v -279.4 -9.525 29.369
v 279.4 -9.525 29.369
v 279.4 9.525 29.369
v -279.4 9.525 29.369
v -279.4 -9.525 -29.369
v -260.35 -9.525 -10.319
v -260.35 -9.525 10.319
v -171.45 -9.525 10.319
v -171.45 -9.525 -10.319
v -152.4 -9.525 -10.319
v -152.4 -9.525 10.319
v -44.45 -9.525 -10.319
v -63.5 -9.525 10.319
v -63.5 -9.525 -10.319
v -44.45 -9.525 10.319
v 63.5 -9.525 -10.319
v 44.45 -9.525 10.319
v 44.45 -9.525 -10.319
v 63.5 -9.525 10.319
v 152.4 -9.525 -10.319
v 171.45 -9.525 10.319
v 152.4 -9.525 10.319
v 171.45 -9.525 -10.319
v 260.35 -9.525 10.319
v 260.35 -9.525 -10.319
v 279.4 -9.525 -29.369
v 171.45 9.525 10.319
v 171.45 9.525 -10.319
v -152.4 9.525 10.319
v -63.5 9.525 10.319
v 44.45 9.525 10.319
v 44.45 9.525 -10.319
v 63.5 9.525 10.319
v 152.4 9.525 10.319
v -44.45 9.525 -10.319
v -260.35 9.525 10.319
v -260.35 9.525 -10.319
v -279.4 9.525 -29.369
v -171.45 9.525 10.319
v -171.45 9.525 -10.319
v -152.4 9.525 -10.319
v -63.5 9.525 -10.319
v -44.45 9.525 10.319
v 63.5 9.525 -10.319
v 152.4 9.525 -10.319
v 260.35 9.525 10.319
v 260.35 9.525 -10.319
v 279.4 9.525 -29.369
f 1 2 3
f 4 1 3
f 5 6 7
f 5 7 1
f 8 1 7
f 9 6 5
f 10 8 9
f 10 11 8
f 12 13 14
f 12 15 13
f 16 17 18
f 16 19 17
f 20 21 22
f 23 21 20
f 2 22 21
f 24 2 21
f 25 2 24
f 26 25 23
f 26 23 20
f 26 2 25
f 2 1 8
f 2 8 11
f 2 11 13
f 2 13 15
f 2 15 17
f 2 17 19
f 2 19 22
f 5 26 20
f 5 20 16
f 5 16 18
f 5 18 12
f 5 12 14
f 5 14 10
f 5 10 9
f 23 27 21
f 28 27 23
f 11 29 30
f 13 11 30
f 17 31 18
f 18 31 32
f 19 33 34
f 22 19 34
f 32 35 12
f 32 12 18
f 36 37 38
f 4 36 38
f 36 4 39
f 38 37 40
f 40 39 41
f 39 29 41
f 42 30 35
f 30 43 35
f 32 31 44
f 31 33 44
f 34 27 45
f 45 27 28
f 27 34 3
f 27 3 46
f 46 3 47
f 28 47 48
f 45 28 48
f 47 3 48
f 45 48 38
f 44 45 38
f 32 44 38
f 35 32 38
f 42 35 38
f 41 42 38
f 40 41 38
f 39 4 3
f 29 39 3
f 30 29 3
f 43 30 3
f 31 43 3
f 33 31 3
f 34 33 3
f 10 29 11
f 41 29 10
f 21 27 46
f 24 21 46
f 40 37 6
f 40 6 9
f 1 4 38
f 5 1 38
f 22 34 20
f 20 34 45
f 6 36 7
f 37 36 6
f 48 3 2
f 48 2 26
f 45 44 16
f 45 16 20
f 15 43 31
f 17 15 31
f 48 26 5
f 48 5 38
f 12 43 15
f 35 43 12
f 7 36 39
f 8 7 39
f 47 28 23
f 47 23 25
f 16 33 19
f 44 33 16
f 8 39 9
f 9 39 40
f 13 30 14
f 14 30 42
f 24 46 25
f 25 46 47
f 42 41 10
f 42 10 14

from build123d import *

# Parameters (mm, degrees)
SKETCH1_W           = 58.7375
SKETCH1_H           = 19.05
BOSS_EXTRUDE1_DEPTH = 279.4
SKETCH2_W           = 88.9
SKETCH2_H           = 20.6375
CUT_EXTRUDE1_DEPTH  = 282.584420692


with BuildPart() as part:
    # Sketch1 → Boss-Extrude1 (new, symmetric)
    with BuildSketch(Plane(origin=(0, 0, 0), x_dir=(0, 0, -1), z_dir=(1, 0, 0))):
        Rectangle(SKETCH1_W, SKETCH1_H)
    extrude(amount=BOSS_EXTRUDE1_DEPTH, both=True)

    # Sketch2 → Cut-Extrude1 (cut, through all)
    with BuildSketch(Plane(origin=(0, 9.525, 0), x_dir=(1, 0, 0), z_dir=(0, 1, 0))):
        with Locations((-215.9, 0)):
            Rectangle(SKETCH2_W, SKETCH2_H)
        with Locations((215.9, 0)):
            Rectangle(SKETCH2_W, SKETCH2_H)
        with Locations((-107.95, 0)):
            Rectangle(SKETCH2_W, SKETCH2_H)
        Rectangle(SKETCH2_W, SKETCH2_H)
        with Locations((107.95, 0)):
            Rectangle(SKETCH2_W, SKETCH2_H)
    extrude(amount=-CUT_EXTRUDE1_DEPTH, mode=Mode.SUBTRACT)


solid = part.part
